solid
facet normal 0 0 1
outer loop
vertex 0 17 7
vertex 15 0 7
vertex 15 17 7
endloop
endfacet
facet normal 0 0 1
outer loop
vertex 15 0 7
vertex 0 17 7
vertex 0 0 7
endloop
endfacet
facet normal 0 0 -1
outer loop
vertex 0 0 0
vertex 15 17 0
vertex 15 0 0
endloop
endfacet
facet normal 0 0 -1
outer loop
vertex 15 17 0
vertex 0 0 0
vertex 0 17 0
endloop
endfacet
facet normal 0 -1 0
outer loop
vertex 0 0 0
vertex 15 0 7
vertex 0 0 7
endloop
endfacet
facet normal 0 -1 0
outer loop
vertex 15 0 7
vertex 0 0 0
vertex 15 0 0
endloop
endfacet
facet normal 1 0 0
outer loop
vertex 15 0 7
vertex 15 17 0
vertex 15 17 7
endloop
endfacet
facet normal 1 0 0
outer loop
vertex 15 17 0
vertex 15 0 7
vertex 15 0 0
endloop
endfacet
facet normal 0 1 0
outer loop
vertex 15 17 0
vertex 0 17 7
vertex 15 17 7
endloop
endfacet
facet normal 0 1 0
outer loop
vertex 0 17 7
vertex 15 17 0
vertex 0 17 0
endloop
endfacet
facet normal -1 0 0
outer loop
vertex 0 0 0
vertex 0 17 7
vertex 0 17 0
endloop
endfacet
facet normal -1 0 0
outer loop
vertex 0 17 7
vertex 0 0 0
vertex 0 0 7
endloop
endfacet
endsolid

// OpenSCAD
// Generated by SolidPython 1.0.1 on 2020-07-29 00:46:55


cube(size = [15, 17, 7]);
/***********************************************
*********      SolidPython code:      **********
************************************************
 
# import packages: SolidPython
from solid import *
from solid.utils import *
from itertools import chain, combinations, permutations


class Resize:

    def __init__(self, scad_file):
        self.scad_file = scad_file
        #self.scad_file = import_scad(scad_file)
        # cone/cylinder param:
        self.r1 = 0
        self.r2 = 0
        self.h = 0
        # rectangular prism param:
        self.w = 0
        self.l = 0
        # ellipse param:
        self.r = 0

    # import OpenScad code (file name corresponds to shape)


    # classify shape + parameters
    def assign(self, param1, param2, param3):
        if self.scad_file == 'cone.scad':
            self.r1 = param1
            self.r2 = param2
            self.h = param3
        elif self.scad_file == 'cylinder.scad':
            self.r1 = param1
            self.r2 = param2
            self.h = param3
        elif self.scad_file == 'rectangularPrism.scad':
            self.h = param1
            self.l = param2
            self.w = param3
        else:
            self.r = param1
            self.h = param2

    # resize parameters
    def iterate(self):
        x = range(3, 20, 2)
        i = 1
        if self.scad_file == 'cone.scad':
            tempList = list(permutations(x, 2))
            for temp in tempList:
                param1 = temp[0]
                param2 = temp[1]
                filepath = 'produced_scad_files/' + 'cone' + str(param1) + '_' + str(param2) + '_' + '.scad'
                scad_render_to_file(cylinder(h=param1, r1=param2, r2=0), filepath)

        elif self.scad_file == 'cylinder.scad':
            tempList = list(permutations(x, 3))
            for temp in tempList:
                param1 = temp[0]
                param2 = temp[1]
                filepath = 'produced_scad_files/' + 'cylinder' + str(param1) + '_' + str(param2) + '_' + '.scad'
                scad_render_to_file(cylinder(h=param1, r1=param2, r2=param2), filepath)

        elif self.scad_file == 'rectangularPrism.scad':
            tempList = list(permutations(x, 3))
            for temp in tempList:
                param1 = temp[0]
                param2 = temp[1]
                param3 = temp[2]
                filepath = 'produced_scad_files/' + 'rectangularPrism' + str(param1) + '_' + str(param2) + '_' + str(
                    param3) + '.scad'
                scad_render_to_file(cube(size=(param1, param2, param3)), filepath)

        elif self.scad_file == 'ellipse.scad':
            tempList = list(permutations(x, 4))
            for temp in tempList:
                param1 = temp[0]
                param2 = temp[1]
                param3 = temp[2]
                param4 = temp[3]
                filepath = 'produced_scad_files/' + 'ellipse' + str(param1) + '_' + str(param2) + '_' + str(param3) + '_' + str(param4) + '.scad'
                scad_render_to_file(scale([param1, param2, param3])(sphere(r=param4)), filepath)

    def render_to_scadfile(self):
        scad_render_to_file(scad, 'example.scad') 
 
************************************************/
